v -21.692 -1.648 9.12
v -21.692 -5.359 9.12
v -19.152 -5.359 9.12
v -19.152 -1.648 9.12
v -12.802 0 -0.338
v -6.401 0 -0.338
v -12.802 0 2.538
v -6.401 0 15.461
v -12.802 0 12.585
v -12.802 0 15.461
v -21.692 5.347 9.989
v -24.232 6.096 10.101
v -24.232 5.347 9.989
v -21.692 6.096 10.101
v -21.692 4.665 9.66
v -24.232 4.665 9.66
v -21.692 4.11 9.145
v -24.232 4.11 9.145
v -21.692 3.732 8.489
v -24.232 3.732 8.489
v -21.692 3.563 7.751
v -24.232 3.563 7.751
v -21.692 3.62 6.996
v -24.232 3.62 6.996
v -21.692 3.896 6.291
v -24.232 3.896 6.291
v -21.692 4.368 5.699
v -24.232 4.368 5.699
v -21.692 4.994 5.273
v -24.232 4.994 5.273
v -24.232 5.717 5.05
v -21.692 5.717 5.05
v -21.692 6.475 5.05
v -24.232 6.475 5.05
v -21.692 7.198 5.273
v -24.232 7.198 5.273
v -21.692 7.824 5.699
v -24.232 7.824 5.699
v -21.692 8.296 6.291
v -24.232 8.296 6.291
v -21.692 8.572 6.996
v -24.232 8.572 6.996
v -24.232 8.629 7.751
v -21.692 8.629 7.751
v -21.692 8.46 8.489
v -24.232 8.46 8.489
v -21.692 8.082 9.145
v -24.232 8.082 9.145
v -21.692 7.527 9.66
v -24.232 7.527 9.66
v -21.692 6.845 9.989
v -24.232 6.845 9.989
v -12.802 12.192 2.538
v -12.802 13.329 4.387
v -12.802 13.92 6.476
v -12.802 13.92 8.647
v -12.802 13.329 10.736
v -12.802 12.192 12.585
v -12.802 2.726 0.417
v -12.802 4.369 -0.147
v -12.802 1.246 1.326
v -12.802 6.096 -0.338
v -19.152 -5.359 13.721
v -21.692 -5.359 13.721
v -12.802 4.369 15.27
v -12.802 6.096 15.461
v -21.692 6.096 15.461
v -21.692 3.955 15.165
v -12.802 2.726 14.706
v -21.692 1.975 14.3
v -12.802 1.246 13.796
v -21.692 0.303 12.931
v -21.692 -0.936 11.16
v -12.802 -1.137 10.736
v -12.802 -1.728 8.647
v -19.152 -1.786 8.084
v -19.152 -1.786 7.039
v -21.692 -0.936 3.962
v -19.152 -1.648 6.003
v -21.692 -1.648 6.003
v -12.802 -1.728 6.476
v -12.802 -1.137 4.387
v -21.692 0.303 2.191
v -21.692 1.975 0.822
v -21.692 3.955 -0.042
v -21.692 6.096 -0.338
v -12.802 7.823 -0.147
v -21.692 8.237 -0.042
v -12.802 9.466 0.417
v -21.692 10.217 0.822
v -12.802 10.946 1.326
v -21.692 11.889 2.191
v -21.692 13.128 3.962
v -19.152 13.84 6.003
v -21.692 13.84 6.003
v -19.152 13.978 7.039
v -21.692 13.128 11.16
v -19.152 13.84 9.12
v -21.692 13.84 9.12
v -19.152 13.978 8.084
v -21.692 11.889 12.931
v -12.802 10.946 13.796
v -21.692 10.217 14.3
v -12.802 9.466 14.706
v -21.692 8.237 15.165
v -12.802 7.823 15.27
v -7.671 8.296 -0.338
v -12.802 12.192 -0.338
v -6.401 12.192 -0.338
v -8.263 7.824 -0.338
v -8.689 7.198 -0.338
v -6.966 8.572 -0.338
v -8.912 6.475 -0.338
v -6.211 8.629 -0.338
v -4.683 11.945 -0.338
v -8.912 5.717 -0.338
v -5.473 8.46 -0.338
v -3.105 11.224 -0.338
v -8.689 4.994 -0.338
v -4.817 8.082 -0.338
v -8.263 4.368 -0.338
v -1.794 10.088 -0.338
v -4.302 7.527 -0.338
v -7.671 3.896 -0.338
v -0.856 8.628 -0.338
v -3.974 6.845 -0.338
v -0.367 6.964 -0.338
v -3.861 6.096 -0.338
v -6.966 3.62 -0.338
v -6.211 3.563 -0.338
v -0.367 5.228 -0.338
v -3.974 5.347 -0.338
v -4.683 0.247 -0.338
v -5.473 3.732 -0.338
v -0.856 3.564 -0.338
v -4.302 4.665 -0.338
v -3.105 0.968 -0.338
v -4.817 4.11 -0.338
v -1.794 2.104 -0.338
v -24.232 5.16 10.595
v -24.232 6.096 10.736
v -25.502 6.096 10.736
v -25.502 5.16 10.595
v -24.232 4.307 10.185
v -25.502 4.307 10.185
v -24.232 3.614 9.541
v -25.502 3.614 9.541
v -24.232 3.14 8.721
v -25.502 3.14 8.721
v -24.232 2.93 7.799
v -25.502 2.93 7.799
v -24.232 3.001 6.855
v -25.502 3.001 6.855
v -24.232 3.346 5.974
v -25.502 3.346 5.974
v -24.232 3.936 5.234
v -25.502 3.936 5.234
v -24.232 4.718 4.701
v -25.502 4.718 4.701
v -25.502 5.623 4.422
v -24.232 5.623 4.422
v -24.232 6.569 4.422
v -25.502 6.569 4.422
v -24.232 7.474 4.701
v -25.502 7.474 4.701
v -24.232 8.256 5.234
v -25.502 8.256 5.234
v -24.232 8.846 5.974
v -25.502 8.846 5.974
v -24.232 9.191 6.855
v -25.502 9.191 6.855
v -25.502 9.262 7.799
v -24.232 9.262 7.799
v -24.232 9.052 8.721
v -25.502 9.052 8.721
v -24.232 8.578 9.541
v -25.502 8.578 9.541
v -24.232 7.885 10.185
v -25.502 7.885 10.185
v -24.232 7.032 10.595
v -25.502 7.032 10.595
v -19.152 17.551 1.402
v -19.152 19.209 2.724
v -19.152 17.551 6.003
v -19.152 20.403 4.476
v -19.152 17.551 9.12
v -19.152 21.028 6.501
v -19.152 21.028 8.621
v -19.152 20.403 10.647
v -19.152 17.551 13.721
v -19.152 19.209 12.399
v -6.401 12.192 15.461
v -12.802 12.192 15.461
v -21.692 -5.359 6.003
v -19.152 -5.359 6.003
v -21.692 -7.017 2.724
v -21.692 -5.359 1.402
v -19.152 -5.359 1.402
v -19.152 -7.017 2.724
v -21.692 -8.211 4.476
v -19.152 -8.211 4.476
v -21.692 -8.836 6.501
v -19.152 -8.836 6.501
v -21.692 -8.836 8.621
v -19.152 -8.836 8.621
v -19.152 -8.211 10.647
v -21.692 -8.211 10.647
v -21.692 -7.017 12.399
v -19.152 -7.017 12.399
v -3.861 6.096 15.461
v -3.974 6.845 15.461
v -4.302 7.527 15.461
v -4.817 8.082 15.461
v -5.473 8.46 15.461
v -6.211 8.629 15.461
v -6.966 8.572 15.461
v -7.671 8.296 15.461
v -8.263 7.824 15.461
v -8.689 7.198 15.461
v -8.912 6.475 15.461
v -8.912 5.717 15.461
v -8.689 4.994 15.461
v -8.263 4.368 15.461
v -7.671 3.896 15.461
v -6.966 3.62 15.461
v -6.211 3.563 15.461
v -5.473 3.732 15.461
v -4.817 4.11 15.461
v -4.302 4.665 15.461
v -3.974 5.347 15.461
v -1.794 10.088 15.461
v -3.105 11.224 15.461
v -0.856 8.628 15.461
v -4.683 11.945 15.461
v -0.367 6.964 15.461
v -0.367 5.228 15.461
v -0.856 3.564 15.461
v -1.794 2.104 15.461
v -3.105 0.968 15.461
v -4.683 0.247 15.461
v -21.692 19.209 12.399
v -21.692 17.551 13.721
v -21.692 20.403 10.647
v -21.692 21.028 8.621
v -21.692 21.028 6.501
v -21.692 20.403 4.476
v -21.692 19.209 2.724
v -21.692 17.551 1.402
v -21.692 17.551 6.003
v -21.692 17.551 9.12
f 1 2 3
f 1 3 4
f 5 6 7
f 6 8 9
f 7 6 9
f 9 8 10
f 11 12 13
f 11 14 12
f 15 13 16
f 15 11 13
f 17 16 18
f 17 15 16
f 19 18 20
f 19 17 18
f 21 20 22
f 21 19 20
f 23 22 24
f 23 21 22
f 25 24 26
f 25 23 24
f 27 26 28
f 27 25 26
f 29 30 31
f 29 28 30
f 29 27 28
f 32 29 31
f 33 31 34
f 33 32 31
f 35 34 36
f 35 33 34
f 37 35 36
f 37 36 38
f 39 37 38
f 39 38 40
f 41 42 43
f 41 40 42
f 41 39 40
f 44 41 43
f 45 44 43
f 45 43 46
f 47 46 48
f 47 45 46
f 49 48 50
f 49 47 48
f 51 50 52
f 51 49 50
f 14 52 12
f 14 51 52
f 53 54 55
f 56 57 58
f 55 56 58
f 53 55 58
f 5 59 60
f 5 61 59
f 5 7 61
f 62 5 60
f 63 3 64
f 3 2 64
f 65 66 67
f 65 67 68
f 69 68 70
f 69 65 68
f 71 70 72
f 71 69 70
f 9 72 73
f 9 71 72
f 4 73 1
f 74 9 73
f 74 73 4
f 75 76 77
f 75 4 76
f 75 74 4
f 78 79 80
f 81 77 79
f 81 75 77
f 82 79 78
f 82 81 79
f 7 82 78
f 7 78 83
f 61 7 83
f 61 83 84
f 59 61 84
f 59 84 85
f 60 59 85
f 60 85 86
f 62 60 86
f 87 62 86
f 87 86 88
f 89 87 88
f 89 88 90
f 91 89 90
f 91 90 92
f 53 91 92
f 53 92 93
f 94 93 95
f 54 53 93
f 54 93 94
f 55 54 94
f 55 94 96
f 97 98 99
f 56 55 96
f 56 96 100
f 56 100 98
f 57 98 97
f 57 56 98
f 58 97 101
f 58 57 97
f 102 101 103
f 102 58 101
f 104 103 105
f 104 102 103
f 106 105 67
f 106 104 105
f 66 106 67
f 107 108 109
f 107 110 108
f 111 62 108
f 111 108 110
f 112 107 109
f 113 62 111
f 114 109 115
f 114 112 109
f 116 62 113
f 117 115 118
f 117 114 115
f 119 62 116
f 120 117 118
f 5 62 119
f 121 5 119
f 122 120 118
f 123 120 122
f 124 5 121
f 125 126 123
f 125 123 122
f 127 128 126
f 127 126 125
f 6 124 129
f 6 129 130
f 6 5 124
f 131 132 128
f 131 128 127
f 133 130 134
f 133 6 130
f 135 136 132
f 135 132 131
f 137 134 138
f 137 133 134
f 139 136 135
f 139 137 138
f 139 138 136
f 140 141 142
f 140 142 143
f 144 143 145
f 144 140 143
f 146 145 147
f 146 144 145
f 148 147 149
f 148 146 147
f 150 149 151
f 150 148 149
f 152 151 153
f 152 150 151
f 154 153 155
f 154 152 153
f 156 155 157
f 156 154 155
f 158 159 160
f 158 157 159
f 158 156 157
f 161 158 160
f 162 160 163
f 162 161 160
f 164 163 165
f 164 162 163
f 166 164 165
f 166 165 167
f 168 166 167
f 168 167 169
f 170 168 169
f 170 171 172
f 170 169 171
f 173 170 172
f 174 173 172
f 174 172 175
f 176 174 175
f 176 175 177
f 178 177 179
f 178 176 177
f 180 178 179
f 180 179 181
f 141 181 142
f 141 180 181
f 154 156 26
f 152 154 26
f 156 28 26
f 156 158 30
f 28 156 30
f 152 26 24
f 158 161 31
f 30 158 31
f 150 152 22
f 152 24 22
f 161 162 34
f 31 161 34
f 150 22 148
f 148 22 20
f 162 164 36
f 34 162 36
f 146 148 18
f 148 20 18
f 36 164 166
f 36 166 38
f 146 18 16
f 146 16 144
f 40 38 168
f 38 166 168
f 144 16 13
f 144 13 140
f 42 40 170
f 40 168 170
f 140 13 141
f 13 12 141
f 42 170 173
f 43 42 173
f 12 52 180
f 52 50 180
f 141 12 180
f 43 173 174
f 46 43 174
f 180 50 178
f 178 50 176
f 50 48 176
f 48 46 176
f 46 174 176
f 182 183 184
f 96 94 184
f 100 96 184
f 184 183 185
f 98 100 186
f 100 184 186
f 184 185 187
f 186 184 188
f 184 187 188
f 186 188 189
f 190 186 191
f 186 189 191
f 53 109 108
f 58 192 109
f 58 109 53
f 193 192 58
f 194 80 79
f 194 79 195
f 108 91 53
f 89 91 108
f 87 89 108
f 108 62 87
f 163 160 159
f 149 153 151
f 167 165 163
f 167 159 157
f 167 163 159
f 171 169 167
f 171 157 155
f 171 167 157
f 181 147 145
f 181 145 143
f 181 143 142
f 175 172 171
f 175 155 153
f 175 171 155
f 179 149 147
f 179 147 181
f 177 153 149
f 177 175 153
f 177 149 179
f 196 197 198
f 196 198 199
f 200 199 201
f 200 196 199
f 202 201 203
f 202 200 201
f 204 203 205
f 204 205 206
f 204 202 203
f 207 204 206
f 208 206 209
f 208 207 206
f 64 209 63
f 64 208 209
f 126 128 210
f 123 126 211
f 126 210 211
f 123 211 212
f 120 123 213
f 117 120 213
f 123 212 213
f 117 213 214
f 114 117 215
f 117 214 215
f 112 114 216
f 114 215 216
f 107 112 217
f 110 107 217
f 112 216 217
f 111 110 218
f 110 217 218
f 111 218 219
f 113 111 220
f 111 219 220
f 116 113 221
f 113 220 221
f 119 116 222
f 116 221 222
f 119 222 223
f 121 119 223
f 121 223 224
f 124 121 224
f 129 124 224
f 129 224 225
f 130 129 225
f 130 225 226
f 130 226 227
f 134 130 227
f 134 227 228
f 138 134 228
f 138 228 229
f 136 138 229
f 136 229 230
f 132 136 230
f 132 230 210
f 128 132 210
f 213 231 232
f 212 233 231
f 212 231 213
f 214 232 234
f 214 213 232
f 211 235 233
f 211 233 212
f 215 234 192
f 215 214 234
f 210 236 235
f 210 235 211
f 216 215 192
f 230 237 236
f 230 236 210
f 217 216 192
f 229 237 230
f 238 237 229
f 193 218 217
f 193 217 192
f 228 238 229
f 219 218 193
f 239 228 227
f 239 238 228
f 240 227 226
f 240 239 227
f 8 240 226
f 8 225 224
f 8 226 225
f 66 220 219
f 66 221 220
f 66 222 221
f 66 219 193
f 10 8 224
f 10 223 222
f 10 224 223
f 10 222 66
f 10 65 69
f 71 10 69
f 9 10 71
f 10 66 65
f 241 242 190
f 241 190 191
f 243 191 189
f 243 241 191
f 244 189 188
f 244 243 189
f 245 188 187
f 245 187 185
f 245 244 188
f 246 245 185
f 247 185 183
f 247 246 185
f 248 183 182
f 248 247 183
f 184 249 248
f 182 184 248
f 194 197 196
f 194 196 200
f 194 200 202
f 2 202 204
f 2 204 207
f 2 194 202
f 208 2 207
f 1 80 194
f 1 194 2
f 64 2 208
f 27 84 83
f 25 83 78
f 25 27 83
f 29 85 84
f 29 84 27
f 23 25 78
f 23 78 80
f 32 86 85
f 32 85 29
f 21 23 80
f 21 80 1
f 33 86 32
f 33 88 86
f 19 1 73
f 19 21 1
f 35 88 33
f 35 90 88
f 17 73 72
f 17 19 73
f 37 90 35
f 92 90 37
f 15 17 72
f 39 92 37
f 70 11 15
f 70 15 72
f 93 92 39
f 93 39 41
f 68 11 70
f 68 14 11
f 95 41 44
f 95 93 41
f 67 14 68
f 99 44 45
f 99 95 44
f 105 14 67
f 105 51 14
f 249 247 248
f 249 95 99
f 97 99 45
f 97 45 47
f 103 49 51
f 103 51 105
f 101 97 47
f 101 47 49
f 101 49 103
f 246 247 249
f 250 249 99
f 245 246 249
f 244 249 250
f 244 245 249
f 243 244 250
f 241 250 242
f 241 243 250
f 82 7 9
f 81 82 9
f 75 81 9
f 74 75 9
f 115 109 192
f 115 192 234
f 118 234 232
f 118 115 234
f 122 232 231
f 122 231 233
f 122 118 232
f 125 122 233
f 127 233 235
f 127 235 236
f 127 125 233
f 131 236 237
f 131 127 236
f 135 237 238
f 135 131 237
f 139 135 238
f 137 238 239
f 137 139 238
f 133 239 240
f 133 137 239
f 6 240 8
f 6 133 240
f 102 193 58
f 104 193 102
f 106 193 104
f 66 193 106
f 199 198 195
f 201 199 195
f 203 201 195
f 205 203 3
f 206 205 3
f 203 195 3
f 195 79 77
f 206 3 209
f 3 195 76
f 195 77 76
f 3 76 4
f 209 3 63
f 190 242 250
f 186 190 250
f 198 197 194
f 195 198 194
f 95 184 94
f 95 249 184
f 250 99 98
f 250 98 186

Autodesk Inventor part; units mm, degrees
ref_plane "YZ Plane" through (0, 0, 0) normal (1, 0, 0) x (0, 1, 0)
ref_plane "XZ Plane" through (0, 0, 0) normal (0, 1, 0) x (-1, 0, 0)
ref_plane "XY Plane" through (0, 0, 0) normal (0, 0, 1) x (1, 0, 0)
sketch "Sketch1" plane through (0, 0, 0) normal (0, 1, 0) x (-1, 0, 0)
  line L0 (0, 15.4608) -> (12.8016, 15.4608)
  line L1 (12.8016, 15.4608) -> (12.8016, -0.338)
  line L2 (12.8016, -0.338) -> (0, -0.338)
  line L3 (0, -0.338) -> (0, 15.4608)
extrude "Extrusion1" add sketch "Sketch1" along normal blind 12.192
sketch "Sketch2" plane through (-12.8016, 0, 15.4608) normal (0, 0, 1) x (1, 0, 0)
  arc A0 (6.4008, 0) -> (6.4008, 12.192) centre (6.4008, 6.096) ccw
  line L0 (0, 12.192) -> (12.8016, 12.192) projected
  line L1 (12.8016, 0) -> (0, 0) projected
  line L2 (6.4008, 0) -> (17.5033, -4.1356)
  line L3 (17.5033, -4.1356) -> (19.4121, 8.0167)
  line L4 (19.4121, 8.0167) -> (11.5072, 13.7088)
  line L5 (11.5072, 13.7088) -> (6.4008, 12.192)
extrude "Extrusion2" cut sketch "Sketch2" along normal mid plane 2540
sketch "Sketch3" plane through (-12.8016, 0, 15.4608) normal (0, 0, 1) x (1, 0, 0)
  arc A0 (6.4008, 0) -> (6.4008, 12.192) centre (6.4008, 6.096) ccw projected
  circle A1 centre (6.4008, 6.096) radius 2.54
  point P0 (12.8016, 0)
  dimension "d8" = 5.08
extrude "Extrusion3" cut sketch "Sketch3" against normal blind 2540
sketch "Sketch4" plane through (-12.8016, 0, -0.338) normal (-1, 0, 0) x (0, 0, 1)
  circle A0 centre (7.8994, 6.096) radius 7.8994
  point P0 (0.338, 0)
extrude "Extrusion4" add sketch "Sketch4" along normal blind 8.89
sketch "Sketch5" plane through (-21.6916, 6.096, 7.5614) normal (-1, 0, 0) x (0, 0, 1)
  circle A0 centre (0, 0) radius 7.8994 projected
  line L0 (-7.8994, 0) -> (7.8994, 0)
  line L1 (1.5587, -11.4554) -> (1.5587, -7.7441)
  line L2 (-1.5587, -7.7441) -> (-1.5587, -11.4554)
  line L3 (-6.1592, -11.4554) -> (-1.5587, -11.4554)
  line L4 (1.5587, -11.4554) -> (6.1592, -11.4554)
  arc A1 (-6.1592, -11.4554) -> (6.1592, -11.4554) centre (0, -7.8994) ccw
  line L5 (-1.5587, -7.7441) -> (1.5587, -7.7441)
  line L6 (1.5587, 7.7441) -> (-1.5587, 7.7441)
  line L7 (1.5587, 7.7441) -> (1.5587, 11.4554)
  line L8 (-1.5587, 11.4554) -> (-1.5587, 7.7441)
  line L9 (-1.5587, 11.4554) -> (-6.1592, 11.4554)
  arc A2 (6.1592, 11.4554) -> (-6.1592, 11.4554) centre (0, 7.8994) ccw
  line L10 (6.1592, 11.4554) -> (1.5587, 11.4554)
  point P0 (-7.5614, -6.096)
  dimension "d16" = 360
extrude "Extrusion5" add sketch "Sketch5" against normal blind 2.54 contours L6 A0 | A0 L8 L9 A2 L10 L7 | L1 L4 A1 L3 L2 A0
sketch "Sketch6" plane through (-21.6916, 0, -0.338) normal (-1, 0, 0) x (0, 0, 1)
  arc A0 (2.8755, 12.192) -> (0, 6.096) centre (7.8994, 6.096) ccw projected
  circle A1 centre (7.8994, 6.096) radius 2.54
  point P0 (0.338, 0)
  dimension "d20" = 5.08
extrude "Extrusion6" add sketch "Sketch6" along normal blind 2.54
sketch "Sketch7" plane through (-24.2316, 6.096, 7.5614) normal (-1, 0, 0) x (0, 0, 1)
  circle A0 centre (0, 0) radius 3.175
  point P0 (-7.5614, -6.096)
  dimension "d23" = 6.35
extrude "Extrusion7" add sketch "Sketch7" along normal blind 1.27
sketch "Sketch10" plane through (-25.5016, 6.096, 7.5614) normal (-1, 0, 0) x (0, 0, 1)
  point P0 (-7.5614, -6.096)
properties part number "Germi01-03-01"
